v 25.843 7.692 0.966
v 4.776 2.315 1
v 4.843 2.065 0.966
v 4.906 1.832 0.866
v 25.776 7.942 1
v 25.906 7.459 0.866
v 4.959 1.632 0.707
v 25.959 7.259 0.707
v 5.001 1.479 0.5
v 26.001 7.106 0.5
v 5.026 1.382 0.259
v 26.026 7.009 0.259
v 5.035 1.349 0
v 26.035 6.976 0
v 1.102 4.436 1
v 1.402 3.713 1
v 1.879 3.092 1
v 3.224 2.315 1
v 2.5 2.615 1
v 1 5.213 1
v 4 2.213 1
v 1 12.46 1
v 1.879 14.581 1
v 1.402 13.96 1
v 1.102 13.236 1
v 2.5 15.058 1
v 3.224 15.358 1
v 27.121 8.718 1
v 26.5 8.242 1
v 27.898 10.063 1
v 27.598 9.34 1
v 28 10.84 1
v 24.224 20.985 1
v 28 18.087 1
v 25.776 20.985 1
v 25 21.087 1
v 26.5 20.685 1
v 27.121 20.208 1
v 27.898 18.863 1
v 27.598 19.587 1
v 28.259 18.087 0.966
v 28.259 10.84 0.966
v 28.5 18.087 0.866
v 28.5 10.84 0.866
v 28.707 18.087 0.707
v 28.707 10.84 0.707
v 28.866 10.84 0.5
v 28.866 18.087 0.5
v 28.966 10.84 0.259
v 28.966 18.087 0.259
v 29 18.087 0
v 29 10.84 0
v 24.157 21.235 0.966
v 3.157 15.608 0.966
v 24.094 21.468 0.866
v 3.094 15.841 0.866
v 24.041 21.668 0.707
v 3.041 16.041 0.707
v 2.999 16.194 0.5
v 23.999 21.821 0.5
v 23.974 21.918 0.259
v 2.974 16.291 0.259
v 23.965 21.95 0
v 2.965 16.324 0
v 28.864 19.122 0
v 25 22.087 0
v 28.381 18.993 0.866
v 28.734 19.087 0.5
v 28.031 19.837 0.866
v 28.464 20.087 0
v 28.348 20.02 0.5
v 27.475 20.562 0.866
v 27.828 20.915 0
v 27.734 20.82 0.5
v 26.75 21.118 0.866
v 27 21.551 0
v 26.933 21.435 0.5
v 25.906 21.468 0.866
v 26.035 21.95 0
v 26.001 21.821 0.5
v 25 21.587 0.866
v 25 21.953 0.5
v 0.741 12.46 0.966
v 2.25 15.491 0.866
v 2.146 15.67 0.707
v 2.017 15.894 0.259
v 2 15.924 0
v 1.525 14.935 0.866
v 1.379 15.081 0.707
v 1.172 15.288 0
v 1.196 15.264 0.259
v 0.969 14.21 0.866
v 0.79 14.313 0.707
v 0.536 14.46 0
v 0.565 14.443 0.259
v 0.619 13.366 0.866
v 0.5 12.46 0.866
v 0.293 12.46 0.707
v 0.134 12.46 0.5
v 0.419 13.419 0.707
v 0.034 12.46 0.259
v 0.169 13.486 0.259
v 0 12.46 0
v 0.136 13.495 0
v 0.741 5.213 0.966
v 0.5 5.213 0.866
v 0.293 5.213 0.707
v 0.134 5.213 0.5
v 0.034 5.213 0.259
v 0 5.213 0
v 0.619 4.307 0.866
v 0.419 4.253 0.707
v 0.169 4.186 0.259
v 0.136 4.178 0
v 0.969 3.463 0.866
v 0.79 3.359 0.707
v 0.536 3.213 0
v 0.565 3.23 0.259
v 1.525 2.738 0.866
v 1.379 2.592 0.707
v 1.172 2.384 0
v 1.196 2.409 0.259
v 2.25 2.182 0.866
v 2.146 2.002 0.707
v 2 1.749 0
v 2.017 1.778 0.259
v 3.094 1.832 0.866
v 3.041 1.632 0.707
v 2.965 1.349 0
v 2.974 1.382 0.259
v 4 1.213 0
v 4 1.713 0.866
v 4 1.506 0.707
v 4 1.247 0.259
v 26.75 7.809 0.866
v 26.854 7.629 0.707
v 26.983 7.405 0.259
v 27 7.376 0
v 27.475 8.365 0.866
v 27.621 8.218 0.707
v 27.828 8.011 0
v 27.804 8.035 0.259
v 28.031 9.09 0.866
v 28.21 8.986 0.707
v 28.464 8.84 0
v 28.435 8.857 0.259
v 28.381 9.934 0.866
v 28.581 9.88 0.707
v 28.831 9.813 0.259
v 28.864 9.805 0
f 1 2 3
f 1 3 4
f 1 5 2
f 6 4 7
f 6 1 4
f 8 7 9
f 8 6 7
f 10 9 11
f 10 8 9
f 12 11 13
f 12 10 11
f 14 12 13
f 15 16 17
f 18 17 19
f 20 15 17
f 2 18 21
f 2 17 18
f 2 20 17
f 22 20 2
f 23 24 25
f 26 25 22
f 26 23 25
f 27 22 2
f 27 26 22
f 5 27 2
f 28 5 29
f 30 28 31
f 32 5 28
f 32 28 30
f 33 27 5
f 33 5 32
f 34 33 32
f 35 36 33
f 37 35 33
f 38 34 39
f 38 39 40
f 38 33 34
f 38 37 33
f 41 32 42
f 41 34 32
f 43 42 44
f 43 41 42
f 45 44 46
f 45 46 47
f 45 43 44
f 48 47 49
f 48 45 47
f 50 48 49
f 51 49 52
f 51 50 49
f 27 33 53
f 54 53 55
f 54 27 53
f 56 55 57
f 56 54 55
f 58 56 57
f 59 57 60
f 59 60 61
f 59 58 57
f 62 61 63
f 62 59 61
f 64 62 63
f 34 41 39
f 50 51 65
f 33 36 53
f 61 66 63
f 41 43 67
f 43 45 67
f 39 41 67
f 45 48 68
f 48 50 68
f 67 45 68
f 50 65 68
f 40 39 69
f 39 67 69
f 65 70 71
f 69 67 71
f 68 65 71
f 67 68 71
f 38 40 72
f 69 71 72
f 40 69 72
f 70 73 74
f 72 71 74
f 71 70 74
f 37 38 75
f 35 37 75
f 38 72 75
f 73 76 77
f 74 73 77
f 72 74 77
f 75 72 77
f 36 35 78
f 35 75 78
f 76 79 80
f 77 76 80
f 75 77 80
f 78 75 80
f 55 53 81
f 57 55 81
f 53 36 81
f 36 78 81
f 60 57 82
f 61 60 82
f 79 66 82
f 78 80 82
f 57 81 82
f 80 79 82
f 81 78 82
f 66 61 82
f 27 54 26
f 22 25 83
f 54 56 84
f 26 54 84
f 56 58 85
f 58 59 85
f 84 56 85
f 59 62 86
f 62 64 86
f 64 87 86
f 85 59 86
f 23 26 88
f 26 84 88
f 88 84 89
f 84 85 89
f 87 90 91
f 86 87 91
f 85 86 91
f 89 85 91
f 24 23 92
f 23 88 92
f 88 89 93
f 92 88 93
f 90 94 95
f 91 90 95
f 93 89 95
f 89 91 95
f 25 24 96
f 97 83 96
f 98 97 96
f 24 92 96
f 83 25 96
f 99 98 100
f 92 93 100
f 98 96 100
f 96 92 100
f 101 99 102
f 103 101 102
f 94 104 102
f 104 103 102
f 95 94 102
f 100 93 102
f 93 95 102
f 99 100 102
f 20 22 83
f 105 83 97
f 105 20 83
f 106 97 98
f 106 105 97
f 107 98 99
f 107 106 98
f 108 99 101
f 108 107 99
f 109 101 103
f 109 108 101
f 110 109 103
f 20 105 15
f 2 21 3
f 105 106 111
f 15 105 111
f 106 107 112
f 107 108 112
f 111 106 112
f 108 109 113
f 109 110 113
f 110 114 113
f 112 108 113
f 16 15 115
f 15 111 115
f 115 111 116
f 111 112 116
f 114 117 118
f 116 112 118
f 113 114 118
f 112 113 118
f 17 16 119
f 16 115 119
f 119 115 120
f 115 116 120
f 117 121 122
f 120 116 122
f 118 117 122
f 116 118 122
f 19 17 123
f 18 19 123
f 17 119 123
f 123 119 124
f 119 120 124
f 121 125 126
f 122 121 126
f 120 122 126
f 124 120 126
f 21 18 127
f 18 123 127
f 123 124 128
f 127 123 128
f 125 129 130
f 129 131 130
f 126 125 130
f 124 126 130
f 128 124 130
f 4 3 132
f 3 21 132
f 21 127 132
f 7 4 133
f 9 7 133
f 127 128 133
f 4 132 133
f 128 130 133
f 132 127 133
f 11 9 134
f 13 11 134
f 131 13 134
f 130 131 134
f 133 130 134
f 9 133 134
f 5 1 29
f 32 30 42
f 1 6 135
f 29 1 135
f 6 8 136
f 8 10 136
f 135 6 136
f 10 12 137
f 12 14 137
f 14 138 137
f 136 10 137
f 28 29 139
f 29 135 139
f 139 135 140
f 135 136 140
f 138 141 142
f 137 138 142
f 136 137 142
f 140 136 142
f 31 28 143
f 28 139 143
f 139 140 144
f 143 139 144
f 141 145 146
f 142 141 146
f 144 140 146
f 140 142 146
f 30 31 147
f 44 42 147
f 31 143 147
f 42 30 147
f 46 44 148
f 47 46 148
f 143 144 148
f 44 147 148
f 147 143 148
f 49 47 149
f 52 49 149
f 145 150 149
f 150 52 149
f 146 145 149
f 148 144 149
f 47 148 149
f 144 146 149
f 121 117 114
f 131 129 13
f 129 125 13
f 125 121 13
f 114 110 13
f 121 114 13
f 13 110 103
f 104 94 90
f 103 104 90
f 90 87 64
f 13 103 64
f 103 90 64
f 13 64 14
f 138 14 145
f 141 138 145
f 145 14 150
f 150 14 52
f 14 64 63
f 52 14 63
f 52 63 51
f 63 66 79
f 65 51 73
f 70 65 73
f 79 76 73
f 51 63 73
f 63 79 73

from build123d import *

# Parameters (mm, degrees)
EXTRUDE_1_DEPTH = 1
FILLET_1_R      = 4
FILLET_2_R      = 1


with BuildPart() as part:
    # Эскиз1 → Бобышка-Вытянуть1 (new body)
    with BuildSketch(Plane.XY):
        Polygon((0, 0), (29, 7.770526581), (29, 23.299669287), (0, 15.529142706), align=None)
    extrude(amount=EXTRUDE_1_DEPTH)

    # Скругление1
    fillet_1_edges = [part.edges().sort_by_distance(p)[0] for p in [
        (0, 15.529142706, 0.5),
        (29, 23.299669287, 0.5),
        (29, 7.770526581, 0.5),
        (0, 0, 0.5),
    ]]
    fillet(fillet_1_edges, radius=FILLET_1_R)

    # Скругление2
    fillet_2_edges = [part.edges().sort_by_distance(p)[0] for p in [
        (27.435045716, 21.260181156, 1),
        (29, 14.463301164, 1),
        (28.173413361, 8.404788816, 1),
        (15.53527618, 4.162664707, 1),
        (1.564954284, 2.03948813, 1),
        (0, 8.836368123, 1),
        (0.826586639, 14.89488047, 1),
        (13.46472382, 19.13700458, 1),
    ]]
    fillet(fillet_2_edges, radius=FILLET_2_R - 0.0001)  # a hair under: the kernel refuses the full size


solid = part.part
